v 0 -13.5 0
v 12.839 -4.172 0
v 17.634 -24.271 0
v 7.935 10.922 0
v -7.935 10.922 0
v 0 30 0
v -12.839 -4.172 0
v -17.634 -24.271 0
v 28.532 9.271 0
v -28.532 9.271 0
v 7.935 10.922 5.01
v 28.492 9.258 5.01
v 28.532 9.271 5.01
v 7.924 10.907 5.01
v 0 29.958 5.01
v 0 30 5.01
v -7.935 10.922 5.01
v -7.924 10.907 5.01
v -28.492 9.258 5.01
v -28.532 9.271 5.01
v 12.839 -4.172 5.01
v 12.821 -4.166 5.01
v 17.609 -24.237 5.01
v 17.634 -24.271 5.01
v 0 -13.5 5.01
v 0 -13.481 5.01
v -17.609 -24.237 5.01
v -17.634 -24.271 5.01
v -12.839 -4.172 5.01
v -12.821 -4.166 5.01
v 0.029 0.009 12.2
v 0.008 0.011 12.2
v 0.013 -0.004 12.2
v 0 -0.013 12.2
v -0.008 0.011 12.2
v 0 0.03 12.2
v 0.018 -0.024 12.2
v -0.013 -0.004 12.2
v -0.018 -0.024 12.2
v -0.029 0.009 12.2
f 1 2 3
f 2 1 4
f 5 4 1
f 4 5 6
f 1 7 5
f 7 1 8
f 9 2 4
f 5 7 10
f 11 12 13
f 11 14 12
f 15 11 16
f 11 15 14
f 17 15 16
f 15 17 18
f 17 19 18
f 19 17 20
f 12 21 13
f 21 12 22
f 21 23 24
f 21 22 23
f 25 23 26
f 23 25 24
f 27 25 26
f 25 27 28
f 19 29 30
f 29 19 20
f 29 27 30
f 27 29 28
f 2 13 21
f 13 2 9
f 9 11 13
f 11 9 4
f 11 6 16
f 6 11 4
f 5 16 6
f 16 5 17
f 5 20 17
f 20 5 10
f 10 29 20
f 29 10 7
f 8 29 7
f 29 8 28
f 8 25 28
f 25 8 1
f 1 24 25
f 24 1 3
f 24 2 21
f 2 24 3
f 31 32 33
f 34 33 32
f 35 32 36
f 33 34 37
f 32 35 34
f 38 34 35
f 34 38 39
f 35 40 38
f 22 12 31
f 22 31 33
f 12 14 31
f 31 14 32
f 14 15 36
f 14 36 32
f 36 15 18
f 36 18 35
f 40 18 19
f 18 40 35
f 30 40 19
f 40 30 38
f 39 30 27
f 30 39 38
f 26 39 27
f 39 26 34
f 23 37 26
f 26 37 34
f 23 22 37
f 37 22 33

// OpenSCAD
/*
  Parametric five-point star for MakerWorld Customizer
  Parameters are grouped and described for the MakerWorld Customizer.
*/

/* [Shape and Size] */

// Outer tip-circle diameter of the star (mm).
star_size = 60; // [3:300]

// Inner valley radius as a percentage of the outer tip radius. Lower values make longer, sharper points.
inner_radius_percent = 45; // [20:1:80]

// Body height (mm). Faceted Apex adds Apex Height above this value; Top Edge Fillet keeps this as the total height.
wall_thickness = 5; // [0.2:0.2:50]

/* [Top Surface] */

// Top treatment: Faceted Apex forms flat triangular faces meeting at the center; Top Edge Fillet keeps the center flat.
top_surface_style = 1; // [1:Faceted Apex, 2:Top Edge Fillet]

// Height from the body to the center apex (mm). Set to 0 for a flat top. Used only with Faceted Apex.
apex_height = 7.2; // [0:0.1:50]

// Radius of the rounded upper perimeter (mm). Used only with Top Edge Fillet.
// Oversized values are automatically limited by the body height and star size.
top_edge_fillet_radius = 3; // [0:0.1:50]

/* [Outline] */

// Rounding of the five outer points (% of Star Size). Set to 0 for sharp points.
corner_rounding_percent = 0; // [0:0.1:20]

/* [Hidden] */

star_point_count = 10;
curve_fn = 48;
top_edge_fillet_layers = 32;
apex_scale = 0.001;

function star_radius(index) =
    index % 2 == 0
        ? star_size / 2
        : star_size * inner_radius_percent / 200;

function star_point(index) =
    let (
        angle = 90 + index * 360 / star_point_count,
        radius = star_radius(index)
    ) [radius * cos(angle), radius * sin(angle)];

function star_points() = [for (i = [0 : star_point_count - 1]) star_point(i)];

module star_outline_sharp() {
    polygon(star_points());
}

// Rounds the convex outer points while preserving the five inner valleys.
module star_outline() {
    requested_radius = max(star_size * corner_rounding_percent / 100, 0);
    max_safe_radius = star_size * 0.20;
    radius = min(requested_radius, max_safe_radius);

    if (radius <= 0.001)
        star_outline_sharp();
    else
        offset(r = radius, $fn = curve_fn)
            offset(r = -radius, $fn = curve_fn)
                star_outline_sharp();
}

// Creates planar roof facets by shrinking the complete star outline almost
// to a point in a single extrusion slice. Concave valleys and rounded outline
// segments are preserved instead of being filled by a convex hull.
module star_faceted_apex() {
    if (apex_height <= 0.001)
        linear_extrude(height = wall_thickness)
            star_outline();
    else
        union() {
            linear_extrude(height = wall_thickness + 0.01)
                star_outline();

            translate([0, 0, wall_thickness])
                linear_extrude(
                    height = apex_height,
                    scale = apex_scale,
                    slices = 1,
                    convexity = 10
                )
                    star_outline();
        }
}

// Creates a quarter-round fillet along only the upper perimeter. The center
// remains flat and wall_thickness remains the total model height.
module star_top_edge_fillet() {
    requested_radius = max(top_edge_fillet_radius, 0);
    max_safe_radius = min(wall_thickness, star_size * 0.08);
    radius = min(requested_radius, max_safe_radius);

    if (requested_radius > max_safe_radius)
        echo(str(
            "Top Edge Fillet Radius limited from ", requested_radius,
            " mm to ", max_safe_radius, " mm for this model size."
        ));

    if (radius <= 0.001) {
        linear_extrude(height = wall_thickness)
            star_outline();
    } else {
        straight_height = wall_thickness - radius;

        if (straight_height > 0)
            linear_extrude(height = straight_height + 0.01)
                star_outline();

        for (i = [0 : top_edge_fillet_layers - 1]) {
            frac0 = i / top_edge_fillet_layers;
            frac1 = (i + 1) / top_edge_fillet_layers;
            inset0 = radius * (1 - cos(90 * frac0));
            z0 = straight_height + radius * sin(90 * frac0);
            z1 = straight_height + radius * sin(90 * frac1);

            translate([0, 0, z0])
                linear_extrude(height = (z1 - z0) + 0.01)
                    offset(r = -inset0)
                        star_outline();
        }
    }
}

module star_model() {
    if (top_surface_style == 2)
        star_top_edge_fillet();
    else
        star_faceted_apex();
}

star_model();
